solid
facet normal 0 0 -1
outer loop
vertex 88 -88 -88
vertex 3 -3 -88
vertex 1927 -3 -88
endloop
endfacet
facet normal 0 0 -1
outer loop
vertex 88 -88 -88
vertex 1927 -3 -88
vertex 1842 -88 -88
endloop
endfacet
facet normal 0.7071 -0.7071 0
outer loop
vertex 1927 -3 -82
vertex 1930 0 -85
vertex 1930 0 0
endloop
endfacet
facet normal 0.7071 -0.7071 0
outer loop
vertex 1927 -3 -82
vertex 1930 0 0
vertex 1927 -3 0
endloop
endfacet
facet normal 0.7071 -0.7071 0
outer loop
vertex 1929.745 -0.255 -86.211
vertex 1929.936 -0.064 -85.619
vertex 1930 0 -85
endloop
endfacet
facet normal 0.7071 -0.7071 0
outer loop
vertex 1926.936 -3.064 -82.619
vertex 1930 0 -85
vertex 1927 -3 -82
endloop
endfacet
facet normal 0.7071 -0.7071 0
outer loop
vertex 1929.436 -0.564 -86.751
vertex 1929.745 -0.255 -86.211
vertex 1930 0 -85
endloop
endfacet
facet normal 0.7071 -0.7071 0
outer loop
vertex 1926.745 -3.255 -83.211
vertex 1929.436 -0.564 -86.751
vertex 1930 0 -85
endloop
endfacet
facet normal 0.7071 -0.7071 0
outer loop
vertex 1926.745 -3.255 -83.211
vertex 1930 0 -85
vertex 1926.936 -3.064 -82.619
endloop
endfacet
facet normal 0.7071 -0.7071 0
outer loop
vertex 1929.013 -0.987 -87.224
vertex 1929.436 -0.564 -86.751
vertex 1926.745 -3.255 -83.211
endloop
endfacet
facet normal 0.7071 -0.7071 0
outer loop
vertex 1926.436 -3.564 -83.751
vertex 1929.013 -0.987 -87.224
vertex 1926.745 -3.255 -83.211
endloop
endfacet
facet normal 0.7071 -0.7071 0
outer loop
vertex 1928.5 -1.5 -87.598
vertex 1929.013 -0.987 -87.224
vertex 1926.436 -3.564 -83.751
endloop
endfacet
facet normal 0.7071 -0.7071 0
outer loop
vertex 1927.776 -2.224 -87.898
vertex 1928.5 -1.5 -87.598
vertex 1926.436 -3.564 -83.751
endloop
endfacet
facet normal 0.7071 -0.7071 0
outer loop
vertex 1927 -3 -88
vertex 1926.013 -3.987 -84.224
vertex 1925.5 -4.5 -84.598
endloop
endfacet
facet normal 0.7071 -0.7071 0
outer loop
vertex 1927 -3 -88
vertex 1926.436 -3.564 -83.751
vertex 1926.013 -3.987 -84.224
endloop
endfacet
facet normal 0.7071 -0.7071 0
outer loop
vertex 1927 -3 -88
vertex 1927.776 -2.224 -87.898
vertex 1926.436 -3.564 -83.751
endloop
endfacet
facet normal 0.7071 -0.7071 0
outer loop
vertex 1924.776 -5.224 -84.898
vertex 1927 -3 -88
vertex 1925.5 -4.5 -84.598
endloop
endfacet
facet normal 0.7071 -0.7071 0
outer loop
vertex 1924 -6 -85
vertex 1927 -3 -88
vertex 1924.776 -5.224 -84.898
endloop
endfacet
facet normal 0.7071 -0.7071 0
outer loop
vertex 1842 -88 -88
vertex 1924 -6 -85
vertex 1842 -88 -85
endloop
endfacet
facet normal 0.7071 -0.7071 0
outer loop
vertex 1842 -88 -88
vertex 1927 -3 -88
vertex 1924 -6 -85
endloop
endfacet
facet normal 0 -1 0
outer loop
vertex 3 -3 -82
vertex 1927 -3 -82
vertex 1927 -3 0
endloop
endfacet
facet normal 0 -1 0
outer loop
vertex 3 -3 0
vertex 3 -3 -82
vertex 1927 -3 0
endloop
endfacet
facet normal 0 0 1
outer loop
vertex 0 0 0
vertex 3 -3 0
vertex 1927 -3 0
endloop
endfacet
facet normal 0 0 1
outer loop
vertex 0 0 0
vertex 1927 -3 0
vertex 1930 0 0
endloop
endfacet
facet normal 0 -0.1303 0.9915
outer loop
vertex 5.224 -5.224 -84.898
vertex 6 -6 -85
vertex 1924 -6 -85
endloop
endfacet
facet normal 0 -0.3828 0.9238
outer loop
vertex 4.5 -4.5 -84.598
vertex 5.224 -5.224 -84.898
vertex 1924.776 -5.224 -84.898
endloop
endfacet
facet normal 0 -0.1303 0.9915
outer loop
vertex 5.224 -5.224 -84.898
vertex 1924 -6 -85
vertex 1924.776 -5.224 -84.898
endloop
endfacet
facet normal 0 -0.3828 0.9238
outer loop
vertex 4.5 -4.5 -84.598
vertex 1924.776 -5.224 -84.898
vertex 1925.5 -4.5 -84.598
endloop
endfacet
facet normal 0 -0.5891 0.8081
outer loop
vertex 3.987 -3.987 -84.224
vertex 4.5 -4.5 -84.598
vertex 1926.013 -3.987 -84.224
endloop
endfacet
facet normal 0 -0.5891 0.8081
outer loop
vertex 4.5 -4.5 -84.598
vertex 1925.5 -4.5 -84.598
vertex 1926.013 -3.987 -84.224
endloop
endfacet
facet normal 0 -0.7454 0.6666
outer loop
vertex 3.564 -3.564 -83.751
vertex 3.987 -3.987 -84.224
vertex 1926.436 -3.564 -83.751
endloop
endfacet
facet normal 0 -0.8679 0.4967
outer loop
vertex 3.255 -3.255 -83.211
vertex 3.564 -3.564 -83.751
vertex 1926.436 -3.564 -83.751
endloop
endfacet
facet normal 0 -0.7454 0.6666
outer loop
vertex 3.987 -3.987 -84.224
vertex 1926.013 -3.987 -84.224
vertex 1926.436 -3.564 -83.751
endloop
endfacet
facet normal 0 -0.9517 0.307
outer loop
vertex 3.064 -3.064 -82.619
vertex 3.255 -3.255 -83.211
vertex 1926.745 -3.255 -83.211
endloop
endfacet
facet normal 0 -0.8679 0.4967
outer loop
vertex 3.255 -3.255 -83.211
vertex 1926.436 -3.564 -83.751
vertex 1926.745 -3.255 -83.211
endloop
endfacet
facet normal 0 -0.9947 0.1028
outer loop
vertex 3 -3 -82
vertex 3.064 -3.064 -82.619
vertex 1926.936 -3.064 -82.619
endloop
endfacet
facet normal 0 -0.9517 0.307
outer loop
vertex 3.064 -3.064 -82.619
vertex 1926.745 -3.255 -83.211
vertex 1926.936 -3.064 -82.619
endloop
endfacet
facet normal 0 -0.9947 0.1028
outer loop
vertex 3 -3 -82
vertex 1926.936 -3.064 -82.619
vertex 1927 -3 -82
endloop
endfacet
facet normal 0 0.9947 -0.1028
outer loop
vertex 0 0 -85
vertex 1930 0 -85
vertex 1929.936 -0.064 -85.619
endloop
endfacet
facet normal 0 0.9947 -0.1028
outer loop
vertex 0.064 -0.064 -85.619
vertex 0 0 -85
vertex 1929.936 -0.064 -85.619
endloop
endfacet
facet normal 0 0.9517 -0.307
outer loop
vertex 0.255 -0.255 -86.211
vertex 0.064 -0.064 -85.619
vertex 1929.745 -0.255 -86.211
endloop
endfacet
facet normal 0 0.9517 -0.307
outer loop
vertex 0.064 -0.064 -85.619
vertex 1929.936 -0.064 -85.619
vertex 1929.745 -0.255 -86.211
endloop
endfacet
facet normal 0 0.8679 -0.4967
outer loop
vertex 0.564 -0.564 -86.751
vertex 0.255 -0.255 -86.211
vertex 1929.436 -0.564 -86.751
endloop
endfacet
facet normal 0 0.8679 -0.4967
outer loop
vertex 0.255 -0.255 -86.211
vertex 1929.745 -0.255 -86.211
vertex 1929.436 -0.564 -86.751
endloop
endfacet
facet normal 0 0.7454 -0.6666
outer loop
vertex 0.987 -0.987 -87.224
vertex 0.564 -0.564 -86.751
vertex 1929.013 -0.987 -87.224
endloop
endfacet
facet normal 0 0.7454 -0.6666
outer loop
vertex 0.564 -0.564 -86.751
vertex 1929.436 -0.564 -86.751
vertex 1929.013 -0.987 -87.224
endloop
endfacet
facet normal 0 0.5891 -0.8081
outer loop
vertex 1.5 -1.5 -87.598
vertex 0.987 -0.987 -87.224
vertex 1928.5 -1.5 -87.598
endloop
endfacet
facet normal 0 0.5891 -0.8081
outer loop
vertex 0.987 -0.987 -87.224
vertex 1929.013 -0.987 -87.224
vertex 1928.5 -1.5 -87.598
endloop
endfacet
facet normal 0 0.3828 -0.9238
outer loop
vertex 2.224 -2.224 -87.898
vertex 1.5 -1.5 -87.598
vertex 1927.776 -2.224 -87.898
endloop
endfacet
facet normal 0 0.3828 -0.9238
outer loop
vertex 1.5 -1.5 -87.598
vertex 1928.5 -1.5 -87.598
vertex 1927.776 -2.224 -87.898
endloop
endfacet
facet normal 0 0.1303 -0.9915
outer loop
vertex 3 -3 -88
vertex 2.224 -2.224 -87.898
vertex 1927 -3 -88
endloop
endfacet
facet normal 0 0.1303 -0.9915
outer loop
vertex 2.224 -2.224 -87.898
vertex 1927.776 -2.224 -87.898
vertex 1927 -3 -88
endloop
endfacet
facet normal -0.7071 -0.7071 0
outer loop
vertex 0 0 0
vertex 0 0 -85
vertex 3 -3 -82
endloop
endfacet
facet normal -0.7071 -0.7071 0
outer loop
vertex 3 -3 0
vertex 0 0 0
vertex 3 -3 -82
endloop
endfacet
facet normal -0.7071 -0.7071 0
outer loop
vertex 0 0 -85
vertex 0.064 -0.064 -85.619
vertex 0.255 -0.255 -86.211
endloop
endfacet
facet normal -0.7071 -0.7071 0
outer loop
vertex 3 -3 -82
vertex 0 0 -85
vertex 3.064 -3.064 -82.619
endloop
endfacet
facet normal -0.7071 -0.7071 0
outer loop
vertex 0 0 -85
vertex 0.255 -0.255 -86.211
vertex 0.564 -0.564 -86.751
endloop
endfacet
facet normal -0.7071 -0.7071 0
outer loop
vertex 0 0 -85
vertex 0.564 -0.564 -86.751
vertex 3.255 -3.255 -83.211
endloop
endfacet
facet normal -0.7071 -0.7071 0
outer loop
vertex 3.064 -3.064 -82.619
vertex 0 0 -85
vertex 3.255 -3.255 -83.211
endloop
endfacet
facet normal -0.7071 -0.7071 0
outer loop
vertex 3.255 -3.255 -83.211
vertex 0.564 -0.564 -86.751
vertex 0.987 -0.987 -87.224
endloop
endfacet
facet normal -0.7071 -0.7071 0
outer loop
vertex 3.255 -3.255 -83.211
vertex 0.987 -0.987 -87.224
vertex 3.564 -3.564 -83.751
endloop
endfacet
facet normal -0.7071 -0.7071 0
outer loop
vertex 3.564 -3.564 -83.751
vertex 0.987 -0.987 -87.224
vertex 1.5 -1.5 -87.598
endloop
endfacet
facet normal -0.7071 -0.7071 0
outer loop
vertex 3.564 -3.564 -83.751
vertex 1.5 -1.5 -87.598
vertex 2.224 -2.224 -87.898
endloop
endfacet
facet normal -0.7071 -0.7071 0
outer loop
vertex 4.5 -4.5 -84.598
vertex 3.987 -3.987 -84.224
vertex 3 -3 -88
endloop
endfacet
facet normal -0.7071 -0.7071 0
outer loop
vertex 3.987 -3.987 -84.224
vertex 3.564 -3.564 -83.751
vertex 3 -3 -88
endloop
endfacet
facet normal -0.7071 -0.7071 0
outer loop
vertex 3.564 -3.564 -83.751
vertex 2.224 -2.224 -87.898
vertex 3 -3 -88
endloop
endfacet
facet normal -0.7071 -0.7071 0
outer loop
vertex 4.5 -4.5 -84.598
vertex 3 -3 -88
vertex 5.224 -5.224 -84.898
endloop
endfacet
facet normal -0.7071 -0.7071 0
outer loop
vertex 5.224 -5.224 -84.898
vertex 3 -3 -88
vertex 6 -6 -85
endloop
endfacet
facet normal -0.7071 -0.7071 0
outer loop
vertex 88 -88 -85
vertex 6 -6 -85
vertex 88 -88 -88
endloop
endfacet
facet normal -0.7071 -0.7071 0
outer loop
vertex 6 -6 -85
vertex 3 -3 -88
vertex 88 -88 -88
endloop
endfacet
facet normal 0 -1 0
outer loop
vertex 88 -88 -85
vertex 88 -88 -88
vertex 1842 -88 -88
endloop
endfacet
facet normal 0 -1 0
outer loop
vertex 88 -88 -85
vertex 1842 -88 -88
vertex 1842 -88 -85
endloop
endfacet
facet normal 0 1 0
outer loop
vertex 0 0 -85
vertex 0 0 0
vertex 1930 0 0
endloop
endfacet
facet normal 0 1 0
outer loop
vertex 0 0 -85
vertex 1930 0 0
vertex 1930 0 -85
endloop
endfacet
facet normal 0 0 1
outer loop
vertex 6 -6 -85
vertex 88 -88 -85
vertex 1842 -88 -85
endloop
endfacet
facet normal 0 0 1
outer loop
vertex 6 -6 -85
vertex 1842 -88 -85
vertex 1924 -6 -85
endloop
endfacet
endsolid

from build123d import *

# Parameters (mm, degrees)
BOSS_EXTRUDE1_DEPTH = 1930
FILLET1_R           = 3
CUT_EXTRUDE1_DEPTH  = 88
CUT_EXTRUDE2_DEPTH  = 88


with BuildPart() as part:
    # Sketch1 → Boss-Extrude1 (new body)
    with BuildSketch(Plane(origin=(0, 0, 0), x_dir=(0, 0, -1), z_dir=(1, 0, 0))):
        Polygon((0, 0), (88, 0), (88, -88), (85, -88), (85, -3), (0, -3), align=None)
    extrude(amount=BOSS_EXTRUDE1_DEPTH)

    # Fillet1
    fillet1_edges = [part.edges().sort_by_distance(p)[0] for p in [
        (965, 0, -88),
        (965, -3, -85),
    ]]
    fillet(fillet1_edges, radius=FILLET1_R)

    # Sketch2 → Cut-Extrude1 (cut)
    with BuildSketch(Plane(origin=(0, 0, -88), x_dir=(-1, 0, 0), z_dir=(0, 0, -1))):
        Polygon((0, 0), (-88, -88), (0, -88), align=None)
    extrude(amount=-CUT_EXTRUDE1_DEPTH, mode=Mode.SUBTRACT)

    # Sketch3 → Cut-Extrude2 (cut)
    with BuildSketch(Plane(origin=(0, 0, -88), x_dir=(-1, 0, 0), z_dir=(0, 0, -1))):
        Polygon((-1930, 0), (-1842, -88), (-1930, -88), align=None)
    extrude(amount=-CUT_EXTRUDE2_DEPTH, mode=Mode.SUBTRACT)


solid = part.part
